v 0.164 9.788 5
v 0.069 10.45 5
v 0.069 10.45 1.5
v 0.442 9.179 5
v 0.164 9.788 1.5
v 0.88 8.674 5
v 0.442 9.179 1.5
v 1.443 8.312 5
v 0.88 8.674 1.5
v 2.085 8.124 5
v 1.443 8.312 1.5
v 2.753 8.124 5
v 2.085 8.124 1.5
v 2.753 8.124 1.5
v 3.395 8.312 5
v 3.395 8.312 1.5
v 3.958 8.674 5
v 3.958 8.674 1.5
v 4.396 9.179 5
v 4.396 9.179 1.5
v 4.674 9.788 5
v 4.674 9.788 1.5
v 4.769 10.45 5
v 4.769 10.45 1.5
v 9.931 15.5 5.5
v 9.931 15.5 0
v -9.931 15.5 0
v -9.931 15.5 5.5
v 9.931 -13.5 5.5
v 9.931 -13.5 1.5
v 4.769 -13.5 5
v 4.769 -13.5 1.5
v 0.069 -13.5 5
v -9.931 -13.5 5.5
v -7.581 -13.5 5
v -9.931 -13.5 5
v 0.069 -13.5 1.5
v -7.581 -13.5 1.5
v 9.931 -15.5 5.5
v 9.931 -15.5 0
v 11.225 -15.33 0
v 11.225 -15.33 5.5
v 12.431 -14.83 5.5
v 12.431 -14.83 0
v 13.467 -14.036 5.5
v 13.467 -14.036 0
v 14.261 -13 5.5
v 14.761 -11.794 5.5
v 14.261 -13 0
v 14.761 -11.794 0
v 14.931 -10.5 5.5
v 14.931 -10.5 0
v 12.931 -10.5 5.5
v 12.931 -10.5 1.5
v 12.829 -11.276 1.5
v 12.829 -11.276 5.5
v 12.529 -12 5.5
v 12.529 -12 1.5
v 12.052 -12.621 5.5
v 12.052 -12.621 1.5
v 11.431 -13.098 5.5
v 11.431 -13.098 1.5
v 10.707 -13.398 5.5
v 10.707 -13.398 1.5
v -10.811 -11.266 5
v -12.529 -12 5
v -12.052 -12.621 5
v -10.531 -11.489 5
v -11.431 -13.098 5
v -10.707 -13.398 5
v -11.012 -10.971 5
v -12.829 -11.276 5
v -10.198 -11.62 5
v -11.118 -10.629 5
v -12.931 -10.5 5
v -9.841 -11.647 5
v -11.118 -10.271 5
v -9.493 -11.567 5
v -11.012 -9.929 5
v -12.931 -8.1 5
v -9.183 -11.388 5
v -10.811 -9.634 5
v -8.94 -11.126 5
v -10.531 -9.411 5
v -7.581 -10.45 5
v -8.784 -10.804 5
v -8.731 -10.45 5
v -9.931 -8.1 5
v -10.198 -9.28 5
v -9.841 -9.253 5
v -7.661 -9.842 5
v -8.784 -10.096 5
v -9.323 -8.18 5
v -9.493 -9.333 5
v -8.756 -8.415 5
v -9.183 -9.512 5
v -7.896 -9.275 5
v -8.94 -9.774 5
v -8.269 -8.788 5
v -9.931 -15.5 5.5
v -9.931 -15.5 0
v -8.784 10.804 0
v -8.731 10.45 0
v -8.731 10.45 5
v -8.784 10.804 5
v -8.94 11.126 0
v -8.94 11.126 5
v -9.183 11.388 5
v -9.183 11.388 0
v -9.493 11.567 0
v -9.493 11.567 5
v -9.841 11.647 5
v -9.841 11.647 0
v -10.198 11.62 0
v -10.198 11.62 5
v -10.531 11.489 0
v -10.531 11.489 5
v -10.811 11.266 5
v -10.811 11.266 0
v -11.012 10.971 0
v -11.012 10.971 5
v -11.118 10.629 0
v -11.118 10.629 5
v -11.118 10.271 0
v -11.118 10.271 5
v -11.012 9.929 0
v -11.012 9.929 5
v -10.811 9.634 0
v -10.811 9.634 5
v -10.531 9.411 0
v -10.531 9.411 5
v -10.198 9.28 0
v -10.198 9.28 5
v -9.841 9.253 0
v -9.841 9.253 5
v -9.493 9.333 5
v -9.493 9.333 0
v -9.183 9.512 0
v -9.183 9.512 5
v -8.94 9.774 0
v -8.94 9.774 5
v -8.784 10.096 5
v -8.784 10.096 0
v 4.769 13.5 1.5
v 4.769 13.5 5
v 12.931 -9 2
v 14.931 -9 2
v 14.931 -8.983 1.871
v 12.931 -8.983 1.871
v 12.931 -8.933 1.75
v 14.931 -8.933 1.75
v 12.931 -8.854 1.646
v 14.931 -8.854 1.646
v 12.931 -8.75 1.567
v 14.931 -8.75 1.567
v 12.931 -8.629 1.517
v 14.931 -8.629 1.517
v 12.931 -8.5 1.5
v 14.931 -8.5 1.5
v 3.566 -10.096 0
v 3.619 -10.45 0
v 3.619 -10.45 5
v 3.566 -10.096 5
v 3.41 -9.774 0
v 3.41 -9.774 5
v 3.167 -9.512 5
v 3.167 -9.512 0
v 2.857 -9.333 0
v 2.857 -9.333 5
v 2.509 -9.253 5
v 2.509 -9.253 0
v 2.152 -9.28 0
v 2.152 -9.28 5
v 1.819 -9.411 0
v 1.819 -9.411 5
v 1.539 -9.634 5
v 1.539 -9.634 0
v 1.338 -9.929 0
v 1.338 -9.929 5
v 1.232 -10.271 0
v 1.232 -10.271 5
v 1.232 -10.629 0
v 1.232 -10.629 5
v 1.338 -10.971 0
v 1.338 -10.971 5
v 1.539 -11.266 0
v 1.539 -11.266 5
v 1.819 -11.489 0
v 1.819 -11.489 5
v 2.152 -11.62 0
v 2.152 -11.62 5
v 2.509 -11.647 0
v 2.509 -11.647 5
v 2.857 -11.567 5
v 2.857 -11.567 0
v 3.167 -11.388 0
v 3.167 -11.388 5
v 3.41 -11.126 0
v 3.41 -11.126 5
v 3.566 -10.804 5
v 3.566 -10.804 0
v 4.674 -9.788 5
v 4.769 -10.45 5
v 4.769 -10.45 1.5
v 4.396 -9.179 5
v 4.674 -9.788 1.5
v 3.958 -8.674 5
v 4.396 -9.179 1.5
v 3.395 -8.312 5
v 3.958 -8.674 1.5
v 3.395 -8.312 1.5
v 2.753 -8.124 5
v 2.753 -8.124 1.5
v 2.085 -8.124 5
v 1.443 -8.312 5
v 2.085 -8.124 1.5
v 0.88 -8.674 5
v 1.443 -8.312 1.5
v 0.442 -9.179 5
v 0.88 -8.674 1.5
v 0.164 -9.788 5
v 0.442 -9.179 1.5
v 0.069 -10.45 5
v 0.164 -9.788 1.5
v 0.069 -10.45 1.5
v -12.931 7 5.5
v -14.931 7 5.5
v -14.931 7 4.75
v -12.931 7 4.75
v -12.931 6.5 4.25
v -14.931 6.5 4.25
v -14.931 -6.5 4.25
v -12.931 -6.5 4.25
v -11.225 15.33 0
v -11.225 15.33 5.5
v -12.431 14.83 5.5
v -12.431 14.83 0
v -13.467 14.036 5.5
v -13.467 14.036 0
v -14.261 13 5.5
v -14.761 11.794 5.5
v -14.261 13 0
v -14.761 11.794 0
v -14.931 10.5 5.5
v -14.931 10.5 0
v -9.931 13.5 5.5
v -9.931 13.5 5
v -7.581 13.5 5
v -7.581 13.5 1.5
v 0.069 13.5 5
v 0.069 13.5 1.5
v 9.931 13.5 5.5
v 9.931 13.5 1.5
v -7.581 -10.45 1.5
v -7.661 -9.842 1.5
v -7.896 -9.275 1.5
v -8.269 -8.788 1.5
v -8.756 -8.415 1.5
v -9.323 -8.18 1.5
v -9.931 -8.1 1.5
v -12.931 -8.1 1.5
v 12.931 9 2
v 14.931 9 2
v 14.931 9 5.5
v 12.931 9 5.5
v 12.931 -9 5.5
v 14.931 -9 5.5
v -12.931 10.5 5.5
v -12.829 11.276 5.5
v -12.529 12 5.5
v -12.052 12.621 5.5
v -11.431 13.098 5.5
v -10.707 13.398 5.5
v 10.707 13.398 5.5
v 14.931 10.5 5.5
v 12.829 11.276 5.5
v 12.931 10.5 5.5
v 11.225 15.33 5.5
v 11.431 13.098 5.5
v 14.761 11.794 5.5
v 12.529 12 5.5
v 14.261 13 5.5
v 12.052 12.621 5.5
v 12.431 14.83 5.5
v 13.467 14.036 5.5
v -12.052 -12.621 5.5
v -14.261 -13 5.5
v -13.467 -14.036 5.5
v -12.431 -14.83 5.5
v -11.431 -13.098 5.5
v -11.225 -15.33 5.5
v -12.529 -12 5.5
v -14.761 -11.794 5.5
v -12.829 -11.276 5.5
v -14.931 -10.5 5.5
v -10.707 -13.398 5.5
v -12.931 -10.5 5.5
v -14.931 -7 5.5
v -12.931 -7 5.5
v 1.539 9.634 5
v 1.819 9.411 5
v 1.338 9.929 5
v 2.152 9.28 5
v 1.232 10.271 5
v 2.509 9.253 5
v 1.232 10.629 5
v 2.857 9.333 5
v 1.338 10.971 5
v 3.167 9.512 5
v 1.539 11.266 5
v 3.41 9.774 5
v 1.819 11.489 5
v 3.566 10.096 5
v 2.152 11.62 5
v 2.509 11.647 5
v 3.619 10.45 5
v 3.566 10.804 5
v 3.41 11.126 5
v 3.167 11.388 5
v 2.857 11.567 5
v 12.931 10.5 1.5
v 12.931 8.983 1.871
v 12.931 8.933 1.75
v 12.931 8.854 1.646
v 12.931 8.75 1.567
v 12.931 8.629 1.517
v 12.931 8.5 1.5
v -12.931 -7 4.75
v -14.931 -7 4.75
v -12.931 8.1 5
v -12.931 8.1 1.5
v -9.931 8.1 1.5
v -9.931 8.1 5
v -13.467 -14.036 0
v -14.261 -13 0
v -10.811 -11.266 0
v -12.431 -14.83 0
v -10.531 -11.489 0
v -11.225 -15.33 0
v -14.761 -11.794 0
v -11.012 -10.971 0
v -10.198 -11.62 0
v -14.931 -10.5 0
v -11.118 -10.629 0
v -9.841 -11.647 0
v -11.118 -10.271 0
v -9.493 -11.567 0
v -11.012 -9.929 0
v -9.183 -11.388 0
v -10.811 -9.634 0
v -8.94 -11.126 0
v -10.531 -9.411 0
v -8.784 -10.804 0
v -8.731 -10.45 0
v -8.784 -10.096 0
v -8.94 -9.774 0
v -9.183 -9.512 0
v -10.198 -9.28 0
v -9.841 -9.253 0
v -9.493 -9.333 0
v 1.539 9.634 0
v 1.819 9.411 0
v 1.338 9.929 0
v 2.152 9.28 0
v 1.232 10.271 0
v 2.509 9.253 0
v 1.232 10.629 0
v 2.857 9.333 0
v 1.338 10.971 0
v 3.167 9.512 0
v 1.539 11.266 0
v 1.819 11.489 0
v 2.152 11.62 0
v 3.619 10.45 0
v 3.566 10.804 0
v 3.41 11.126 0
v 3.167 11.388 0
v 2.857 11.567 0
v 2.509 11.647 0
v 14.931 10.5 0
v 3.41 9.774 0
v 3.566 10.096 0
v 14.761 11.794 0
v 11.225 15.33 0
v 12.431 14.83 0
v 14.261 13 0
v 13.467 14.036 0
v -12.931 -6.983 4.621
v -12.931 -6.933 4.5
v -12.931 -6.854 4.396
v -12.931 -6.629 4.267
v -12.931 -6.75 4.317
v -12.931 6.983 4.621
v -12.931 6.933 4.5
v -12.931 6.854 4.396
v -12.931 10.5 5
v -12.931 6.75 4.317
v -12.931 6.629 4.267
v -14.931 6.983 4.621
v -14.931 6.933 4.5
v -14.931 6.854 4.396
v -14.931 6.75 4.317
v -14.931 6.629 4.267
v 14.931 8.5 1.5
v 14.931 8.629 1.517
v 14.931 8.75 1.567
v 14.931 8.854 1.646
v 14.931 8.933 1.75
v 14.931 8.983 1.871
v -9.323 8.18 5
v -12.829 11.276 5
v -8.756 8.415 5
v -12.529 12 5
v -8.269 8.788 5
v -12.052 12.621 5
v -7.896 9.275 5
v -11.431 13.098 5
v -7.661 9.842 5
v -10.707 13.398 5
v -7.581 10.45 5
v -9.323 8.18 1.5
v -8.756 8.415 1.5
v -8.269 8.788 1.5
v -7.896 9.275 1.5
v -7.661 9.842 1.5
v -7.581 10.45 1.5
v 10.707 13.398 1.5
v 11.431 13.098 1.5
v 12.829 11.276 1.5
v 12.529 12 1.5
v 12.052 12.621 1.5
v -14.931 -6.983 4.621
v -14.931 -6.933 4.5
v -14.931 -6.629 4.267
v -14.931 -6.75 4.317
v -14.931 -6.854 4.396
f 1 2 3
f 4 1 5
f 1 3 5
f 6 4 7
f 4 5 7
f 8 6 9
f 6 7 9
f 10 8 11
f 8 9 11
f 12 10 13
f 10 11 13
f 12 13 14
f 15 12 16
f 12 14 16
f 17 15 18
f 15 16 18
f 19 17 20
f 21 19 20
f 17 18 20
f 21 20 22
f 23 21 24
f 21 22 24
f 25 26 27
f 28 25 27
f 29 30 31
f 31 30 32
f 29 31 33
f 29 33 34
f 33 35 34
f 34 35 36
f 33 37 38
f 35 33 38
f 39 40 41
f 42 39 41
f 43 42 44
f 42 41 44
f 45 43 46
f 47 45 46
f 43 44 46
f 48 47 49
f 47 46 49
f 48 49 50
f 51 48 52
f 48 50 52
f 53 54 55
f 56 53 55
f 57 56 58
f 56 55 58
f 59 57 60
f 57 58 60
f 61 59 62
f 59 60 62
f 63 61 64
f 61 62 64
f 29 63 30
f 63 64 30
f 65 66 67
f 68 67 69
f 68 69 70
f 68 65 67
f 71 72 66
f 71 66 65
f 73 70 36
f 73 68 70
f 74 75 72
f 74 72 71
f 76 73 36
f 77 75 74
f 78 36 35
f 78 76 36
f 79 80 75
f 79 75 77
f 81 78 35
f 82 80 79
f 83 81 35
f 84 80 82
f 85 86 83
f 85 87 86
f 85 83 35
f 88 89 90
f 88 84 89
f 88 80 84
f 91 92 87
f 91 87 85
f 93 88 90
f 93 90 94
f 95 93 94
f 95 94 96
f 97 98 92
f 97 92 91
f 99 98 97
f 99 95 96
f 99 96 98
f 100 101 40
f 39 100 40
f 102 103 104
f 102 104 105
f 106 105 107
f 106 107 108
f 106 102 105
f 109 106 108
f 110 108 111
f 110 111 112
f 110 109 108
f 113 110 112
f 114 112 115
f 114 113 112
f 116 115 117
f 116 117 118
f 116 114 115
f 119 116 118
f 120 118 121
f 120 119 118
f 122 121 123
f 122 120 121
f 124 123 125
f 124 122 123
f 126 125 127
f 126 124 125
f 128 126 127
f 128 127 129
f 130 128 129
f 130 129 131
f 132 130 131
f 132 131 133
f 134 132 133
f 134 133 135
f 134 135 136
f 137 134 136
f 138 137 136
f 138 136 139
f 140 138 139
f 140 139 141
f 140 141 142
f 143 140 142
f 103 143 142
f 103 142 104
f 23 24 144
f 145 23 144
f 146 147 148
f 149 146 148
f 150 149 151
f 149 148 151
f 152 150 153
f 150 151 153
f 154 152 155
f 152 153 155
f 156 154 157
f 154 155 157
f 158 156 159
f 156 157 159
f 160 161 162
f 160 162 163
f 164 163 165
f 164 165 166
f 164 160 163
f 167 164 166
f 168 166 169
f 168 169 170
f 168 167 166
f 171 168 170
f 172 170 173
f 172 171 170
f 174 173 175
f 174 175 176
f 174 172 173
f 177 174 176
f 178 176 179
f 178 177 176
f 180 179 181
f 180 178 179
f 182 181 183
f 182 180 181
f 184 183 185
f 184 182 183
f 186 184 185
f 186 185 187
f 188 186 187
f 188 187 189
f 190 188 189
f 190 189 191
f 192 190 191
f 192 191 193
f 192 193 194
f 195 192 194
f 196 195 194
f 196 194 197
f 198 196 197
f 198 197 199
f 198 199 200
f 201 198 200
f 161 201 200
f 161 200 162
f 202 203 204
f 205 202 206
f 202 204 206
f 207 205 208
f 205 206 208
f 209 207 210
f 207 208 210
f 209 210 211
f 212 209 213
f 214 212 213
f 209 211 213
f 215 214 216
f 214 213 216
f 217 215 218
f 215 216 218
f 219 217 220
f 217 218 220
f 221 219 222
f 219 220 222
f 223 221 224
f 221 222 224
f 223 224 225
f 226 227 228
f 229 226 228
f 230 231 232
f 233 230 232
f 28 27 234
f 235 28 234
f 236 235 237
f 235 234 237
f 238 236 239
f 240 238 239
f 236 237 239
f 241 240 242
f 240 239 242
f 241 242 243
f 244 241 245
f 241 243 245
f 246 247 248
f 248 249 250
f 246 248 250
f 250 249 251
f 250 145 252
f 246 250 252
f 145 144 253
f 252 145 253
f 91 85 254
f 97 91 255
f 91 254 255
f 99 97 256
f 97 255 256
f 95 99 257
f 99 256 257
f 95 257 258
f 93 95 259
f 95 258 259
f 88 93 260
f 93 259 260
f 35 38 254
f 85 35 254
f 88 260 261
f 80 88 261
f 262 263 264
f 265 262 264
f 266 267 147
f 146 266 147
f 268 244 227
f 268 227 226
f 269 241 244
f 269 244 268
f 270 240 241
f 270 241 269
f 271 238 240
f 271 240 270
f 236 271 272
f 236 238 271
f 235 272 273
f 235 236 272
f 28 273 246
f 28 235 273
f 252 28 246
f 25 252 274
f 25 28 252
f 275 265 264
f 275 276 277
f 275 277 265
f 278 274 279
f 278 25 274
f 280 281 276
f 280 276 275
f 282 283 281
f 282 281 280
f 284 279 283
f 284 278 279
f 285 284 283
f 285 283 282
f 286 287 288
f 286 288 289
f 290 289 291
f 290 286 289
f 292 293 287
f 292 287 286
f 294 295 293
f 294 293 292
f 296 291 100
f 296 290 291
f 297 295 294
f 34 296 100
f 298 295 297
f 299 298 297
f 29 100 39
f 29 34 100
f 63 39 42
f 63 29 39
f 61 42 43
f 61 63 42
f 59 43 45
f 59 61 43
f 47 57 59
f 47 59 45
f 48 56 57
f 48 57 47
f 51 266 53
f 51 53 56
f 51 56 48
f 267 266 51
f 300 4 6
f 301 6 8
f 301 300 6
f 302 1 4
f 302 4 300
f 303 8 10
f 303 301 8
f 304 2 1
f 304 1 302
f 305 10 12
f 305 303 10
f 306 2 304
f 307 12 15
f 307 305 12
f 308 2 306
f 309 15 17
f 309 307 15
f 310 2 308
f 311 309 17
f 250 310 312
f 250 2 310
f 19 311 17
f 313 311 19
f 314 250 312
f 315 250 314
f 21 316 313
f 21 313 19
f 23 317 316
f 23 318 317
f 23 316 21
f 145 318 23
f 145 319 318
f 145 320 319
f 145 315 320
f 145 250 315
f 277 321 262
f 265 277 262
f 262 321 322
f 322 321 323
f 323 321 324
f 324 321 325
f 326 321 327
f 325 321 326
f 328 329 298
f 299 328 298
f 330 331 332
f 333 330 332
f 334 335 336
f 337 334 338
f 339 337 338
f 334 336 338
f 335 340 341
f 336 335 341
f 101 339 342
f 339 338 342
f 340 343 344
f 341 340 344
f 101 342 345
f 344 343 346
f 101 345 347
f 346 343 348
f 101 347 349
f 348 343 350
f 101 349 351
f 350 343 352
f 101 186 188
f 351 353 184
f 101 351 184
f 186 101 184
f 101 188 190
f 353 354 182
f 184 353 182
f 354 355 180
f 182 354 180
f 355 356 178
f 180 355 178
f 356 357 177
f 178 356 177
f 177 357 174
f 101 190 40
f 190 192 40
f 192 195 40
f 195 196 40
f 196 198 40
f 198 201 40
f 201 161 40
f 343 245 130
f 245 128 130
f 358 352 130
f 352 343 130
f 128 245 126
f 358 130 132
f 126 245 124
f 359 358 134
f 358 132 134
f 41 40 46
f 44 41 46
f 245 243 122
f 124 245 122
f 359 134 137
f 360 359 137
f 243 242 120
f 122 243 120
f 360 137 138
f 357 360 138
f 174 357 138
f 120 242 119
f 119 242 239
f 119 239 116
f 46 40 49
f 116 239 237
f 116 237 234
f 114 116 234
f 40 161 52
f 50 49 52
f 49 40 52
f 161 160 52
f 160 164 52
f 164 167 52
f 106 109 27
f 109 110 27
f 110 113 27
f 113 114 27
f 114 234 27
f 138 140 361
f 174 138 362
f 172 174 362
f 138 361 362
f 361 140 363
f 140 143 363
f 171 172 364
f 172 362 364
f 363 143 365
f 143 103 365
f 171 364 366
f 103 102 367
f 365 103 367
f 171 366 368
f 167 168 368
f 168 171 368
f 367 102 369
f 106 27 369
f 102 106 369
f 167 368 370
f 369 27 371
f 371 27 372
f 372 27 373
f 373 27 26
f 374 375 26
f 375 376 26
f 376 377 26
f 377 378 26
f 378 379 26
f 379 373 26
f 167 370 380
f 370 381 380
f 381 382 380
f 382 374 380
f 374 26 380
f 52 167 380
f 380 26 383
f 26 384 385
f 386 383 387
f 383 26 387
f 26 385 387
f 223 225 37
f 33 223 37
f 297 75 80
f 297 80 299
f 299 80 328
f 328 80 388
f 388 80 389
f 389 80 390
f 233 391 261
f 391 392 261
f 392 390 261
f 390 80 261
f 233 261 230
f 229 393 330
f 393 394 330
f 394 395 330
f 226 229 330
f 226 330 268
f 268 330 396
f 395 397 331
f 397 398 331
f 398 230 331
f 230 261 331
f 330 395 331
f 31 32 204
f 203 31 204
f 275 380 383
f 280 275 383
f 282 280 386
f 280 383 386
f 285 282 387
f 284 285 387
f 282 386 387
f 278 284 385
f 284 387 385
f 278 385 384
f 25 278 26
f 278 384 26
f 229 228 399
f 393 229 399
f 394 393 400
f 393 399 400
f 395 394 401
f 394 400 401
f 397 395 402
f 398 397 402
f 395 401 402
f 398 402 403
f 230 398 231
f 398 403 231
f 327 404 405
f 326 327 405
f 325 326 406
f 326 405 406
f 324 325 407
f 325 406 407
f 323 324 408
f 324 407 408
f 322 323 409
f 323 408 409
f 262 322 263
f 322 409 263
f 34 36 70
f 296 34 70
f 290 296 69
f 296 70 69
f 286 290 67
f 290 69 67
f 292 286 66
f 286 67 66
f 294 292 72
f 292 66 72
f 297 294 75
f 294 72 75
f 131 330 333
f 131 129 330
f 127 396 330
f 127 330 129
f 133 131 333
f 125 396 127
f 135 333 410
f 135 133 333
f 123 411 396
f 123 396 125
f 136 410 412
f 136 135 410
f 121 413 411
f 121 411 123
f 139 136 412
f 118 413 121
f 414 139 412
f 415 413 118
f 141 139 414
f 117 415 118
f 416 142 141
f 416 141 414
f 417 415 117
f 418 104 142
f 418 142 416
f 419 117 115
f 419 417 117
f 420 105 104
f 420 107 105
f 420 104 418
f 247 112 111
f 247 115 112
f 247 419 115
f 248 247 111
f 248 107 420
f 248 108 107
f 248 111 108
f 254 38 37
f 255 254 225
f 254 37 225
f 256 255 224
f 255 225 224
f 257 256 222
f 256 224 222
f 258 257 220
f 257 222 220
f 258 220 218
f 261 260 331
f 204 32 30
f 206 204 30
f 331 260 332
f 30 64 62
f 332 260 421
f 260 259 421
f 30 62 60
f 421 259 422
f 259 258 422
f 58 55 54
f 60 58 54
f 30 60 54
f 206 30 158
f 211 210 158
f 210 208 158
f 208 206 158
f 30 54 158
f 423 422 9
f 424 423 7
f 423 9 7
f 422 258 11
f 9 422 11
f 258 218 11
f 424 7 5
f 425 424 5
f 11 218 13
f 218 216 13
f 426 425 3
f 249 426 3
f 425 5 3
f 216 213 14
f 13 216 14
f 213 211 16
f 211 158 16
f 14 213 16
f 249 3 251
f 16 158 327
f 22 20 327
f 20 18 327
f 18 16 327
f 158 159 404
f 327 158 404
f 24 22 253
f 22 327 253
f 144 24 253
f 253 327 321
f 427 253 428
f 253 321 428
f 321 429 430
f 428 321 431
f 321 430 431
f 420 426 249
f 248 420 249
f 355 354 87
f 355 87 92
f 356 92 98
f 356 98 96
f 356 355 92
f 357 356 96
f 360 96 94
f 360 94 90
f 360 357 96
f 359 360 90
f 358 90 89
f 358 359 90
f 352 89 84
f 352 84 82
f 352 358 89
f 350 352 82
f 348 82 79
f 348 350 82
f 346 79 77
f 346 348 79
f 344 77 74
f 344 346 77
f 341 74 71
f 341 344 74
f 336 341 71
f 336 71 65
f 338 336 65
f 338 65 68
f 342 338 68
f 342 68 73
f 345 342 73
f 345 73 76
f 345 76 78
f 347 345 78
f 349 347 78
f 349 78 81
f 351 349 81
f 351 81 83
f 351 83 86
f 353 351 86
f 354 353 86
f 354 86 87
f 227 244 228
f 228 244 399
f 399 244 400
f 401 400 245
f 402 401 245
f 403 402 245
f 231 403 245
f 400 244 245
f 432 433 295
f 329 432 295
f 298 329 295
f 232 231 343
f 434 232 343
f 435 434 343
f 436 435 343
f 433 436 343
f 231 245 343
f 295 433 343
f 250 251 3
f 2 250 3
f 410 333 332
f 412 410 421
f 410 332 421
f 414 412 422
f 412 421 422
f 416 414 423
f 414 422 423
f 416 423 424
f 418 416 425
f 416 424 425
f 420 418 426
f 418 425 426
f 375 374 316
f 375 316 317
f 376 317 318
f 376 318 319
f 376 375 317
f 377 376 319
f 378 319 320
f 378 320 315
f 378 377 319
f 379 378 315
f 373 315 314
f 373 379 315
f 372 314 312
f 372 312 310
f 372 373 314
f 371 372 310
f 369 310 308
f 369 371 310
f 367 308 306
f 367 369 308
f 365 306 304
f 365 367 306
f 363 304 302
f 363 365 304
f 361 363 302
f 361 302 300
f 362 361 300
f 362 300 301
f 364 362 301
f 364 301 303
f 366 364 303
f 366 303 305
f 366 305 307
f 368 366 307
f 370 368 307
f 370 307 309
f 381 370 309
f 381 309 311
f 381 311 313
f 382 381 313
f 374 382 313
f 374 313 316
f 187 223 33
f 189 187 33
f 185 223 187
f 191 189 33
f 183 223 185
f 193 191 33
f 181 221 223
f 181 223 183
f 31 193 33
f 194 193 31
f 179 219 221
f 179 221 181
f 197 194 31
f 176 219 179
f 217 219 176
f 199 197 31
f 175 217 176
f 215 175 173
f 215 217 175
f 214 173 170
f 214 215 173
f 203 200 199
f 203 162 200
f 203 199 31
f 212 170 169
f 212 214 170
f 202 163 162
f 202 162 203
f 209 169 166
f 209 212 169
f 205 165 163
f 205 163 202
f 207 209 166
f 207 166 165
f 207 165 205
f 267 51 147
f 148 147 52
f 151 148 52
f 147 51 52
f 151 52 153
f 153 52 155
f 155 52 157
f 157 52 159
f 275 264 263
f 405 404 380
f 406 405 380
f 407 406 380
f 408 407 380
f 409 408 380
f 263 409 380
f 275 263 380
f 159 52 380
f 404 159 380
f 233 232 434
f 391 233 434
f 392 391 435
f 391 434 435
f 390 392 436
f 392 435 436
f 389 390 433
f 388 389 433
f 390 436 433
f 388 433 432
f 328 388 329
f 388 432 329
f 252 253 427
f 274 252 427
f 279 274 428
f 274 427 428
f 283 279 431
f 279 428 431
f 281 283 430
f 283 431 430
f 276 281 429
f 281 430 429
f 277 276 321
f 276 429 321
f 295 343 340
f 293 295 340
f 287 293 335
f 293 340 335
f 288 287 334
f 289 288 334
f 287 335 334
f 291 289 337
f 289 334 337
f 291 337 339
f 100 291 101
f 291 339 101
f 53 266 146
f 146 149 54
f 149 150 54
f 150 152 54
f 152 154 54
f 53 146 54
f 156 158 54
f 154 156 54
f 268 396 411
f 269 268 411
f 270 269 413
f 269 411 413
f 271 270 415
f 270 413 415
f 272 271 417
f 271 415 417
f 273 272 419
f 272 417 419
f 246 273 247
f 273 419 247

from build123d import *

# Parameters (mm, degrees)
F0_R     = 1.2
F1_DEPTH = 1.5
F2_DEPTH = 5
F3_DEPTH = 5.5
F5_DEPTH = 2
F7_DEPTH = 2


# Not quite as in the source:
# - a feature names something its author has since deleted; it is built from what else it names


with BuildPart() as f1:
    # F0 (on Top) → F1 (new body)
    with BuildSketch(Plane.XY):
        with BuildLine():
            Line((14.9310000289, -10.5), (14.9310000289, 10.5))
            ThreePointArc((14.9310000289, 10.5), (13.4665339264, 14.0355339264), (9.931, 15.5000000289))
            Line((9.931, 15.5000000289), (-9.931, 15.5000000289))
            ThreePointArc((-9.931, 15.5000000289), (-13.4665339264, 14.0355339264), (-14.9310000289, 10.5))
            Line((-14.9310000289, 10.5), (-14.9310000289, -10.5))
            ThreePointArc((-14.9310000289, -10.5), (-13.4665339264, -14.0355339264), (-9.931, -15.5000000289))
            Line((-9.931, -15.5000000289), (9.931, -15.5000000289))
            ThreePointArc((9.931, -15.5000000289), (13.4665339264, -14.0355339264), (14.9310000289, -10.5))
        make_face()
        with BuildLine():
            Line((-9.931, 13.5000000289), (-7.581, 13.5000000289))
            Line((-7.581, 13.5000000289), (0.069, 13.5000000289))
            Line((0.069, 13.5000000289), (4.769, 13.5000000289))
            Line((4.769, 13.5000000289), (9.931, 13.5000000289))
            ThreePointArc((9.931, 13.5000000289), (12.052320364, 12.621320364), (12.9310000289, 10.5))
            Line((12.9310000289, 10.5), (12.9310000289, -10.5))
            ThreePointArc((12.9310000289, -10.5), (12.052320364, -12.621320364), (9.931, -13.5000000289))
            Line((9.931, -13.5000000289), (4.769, -13.5000000289))
            Line((4.769, -13.5000000289), (0.069, -13.5000000289))
            Line((0.069, -13.5000000289), (-7.581, -13.5000000289))
            Line((-7.581, -13.5000000289), (-9.931, -13.5000000289))
            ThreePointArc((-9.931, -13.5000000289), (-12.052320364, -12.621320364), (-12.9310000289, -10.5))
            Line((-12.9310000289, -10.5), (-12.9310000289, -8.1))
            Line((-12.9310000289, -8.1), (-12.9310000289, 8.1))
            Line((-12.9310000289, 8.1), (-12.9310000289, 10.5))
            ThreePointArc((-12.9310000289, 10.5), (-12.052320364, 12.621320364), (-9.931, 13.5000000289))
        make_face(mode=Mode.SUBTRACT)
        with BuildLine():
            ThreePointArc((4.769, -10.45), (2.419, -8.1), (0.069, -10.45))
            ThreePointArc((0.069, -10.45), (2.419, -12.8), (4.769, -10.45))
        make_face()
        with Locations((2.419, -10.45)):
            Circle(F0_R, mode=Mode.SUBTRACT)
        with BuildLine():
            ThreePointArc((4.769, 10.45), (2.419, 12.8), (0.069, 10.45))
            ThreePointArc((0.069, 10.45), (2.419, 8.1), (4.769, 10.45))
        make_face()
        with Locations((2.419, 10.45)):
            Circle(F0_R, mode=Mode.SUBTRACT)
        with BuildLine():
            ThreePointArc((-9.931, 8.1), (-11.5927009358, 12.1117009358), (-7.581, 10.45))
            Line((-7.581, 10.45), (-7.581, 13.5000000289))
            Line((-7.581, 13.5000000289), (-9.931, 13.5000000289))
            ThreePointArc((-9.931, 13.5000000289), (-12.052320364, 12.621320364), (-12.9310000289, 10.5))
            Line((-12.9310000289, 10.5), (-12.9310000289, 8.1))
            Line((-12.9310000289, 8.1), (-9.931, 8.1))
        make_face()
        with BuildLine():
            Line((-9.931, -8.1), (-12.9310000289, -8.1))
            Line((-12.9310000289, -8.1), (-12.9310000289, -10.5))
            ThreePointArc((-12.9310000289, -10.5), (-12.052320364, -12.621320364), (-9.931, -13.5000000289))
            Line((-9.931, -13.5000000289), (-7.581, -13.5000000289))
            Line((-7.581, -13.5000000289), (-7.581, -10.45))
            ThreePointArc((-7.581, -10.45), (-11.5927009358, -12.1117009358), (-9.931, -8.1))
        make_face()
        with BuildLine():
            ThreePointArc((-7.581, -10.45), (-8.2692990642, -8.7882990642), (-9.931, -8.1))
            ThreePointArc((-9.931, -8.1), (-11.5927009358, -12.1117009358), (-7.581, -10.45))
        make_face()
        with Locations((-9.931, -10.45)):
            Circle(F0_R, mode=Mode.SUBTRACT)
        with BuildLine():
            Line((0.069, -10.45), (0.069, -13.5000000289))
            Line((0.069, -13.5000000289), (4.769, -13.5000000289))
            Line((4.769, -13.5000000289), (4.769, -10.45))
            ThreePointArc((4.769, -10.45), (2.419, -12.8), (0.069, -10.45))
        make_face()
        with BuildLine():
            ThreePointArc((-9.931, 8.1), (-8.2692990642, 8.7882990642), (-7.581, 10.45))
            ThreePointArc((-7.581, 10.45), (-11.5927009358, 12.1117009358), (-9.931, 8.1))
        make_face()
        with Locations((-9.931, 10.45)):
            Circle(F0_R, mode=Mode.SUBTRACT)
        with BuildLine():
            Line((4.769, 13.5000000289), (0.069, 13.5000000289))
            Line((0.069, 13.5000000289), (0.069, 10.45))
            ThreePointArc((0.069, 10.45), (2.419, 12.8), (4.769, 10.45))
            Line((4.769, 10.45), (4.769, 13.5000000289))
        make_face()
        with BuildLine():
            Line((-7.581, 13.5000000289), (-7.581, 10.45))
            ThreePointArc((-7.581, 10.45), (-8.2692990642, 8.7882990642), (-9.931, 8.1))
            Line((-9.931, 8.1), (-12.9310000289, 8.1))
            Line((-12.9310000289, 8.1), (-12.9310000289, -8.1))
            Line((-12.9310000289, -8.1), (-9.931, -8.1))
            ThreePointArc((-9.931, -8.1), (-8.2692990642, -8.7882990642), (-7.581, -10.45))
            Line((-7.581, -10.45), (-7.581, -13.5000000289))
            Line((-7.581, -13.5000000289), (0.069, -13.5000000289))
            Line((0.069, -13.5000000289), (0.069, -10.45))
            ThreePointArc((0.069, -10.45), (2.419, -8.1), (4.769, -10.45))
            Line((4.769, -10.45), (4.769, -13.5000000289))
            Line((4.769, -13.5000000289), (9.931, -13.5000000289))
            ThreePointArc((9.931, -13.5000000289), (12.052320364, -12.621320364), (12.9310000289, -10.5))
            Line((12.9310000289, -10.5), (12.9310000289, 10.5))
            ThreePointArc((12.9310000289, 10.5), (12.052320364, 12.621320364), (9.931, 13.5000000289))
            Line((9.931, 13.5000000289), (4.769, 13.5000000289))
            Line((4.769, 13.5000000289), (4.769, 10.45))
            ThreePointArc((4.769, 10.45), (2.419, 8.1), (0.069, 10.45))
            Line((0.069, 10.45), (0.069, 13.5000000289))
            Line((0.069, 13.5000000289), (-7.581, 13.5000000289))
        make_face()
    extrude(amount=F1_DEPTH)

    # F0 (on Top) → F2 (join)
    with BuildSketch(Plane.XY):
        with BuildLine():
            ThreePointArc((-9.931, 8.1), (-11.5927009358, 12.1117009358), (-7.581, 10.45))
            Line((-7.581, 10.45), (-7.581, 13.5000000289))
            Line((-7.581, 13.5000000289), (-9.931, 13.5000000289))
            ThreePointArc((-9.931, 13.5000000289), (-12.052320364, 12.621320364), (-12.9310000289, 10.5))
            Line((-12.9310000289, 10.5), (-12.9310000289, 8.1))
            Line((-12.9310000289, 8.1), (-9.931, 8.1))
        make_face()
        with BuildLine():
            ThreePointArc((-9.931, 8.1), (-8.2692990642, 8.7882990642), (-7.581, 10.45))
            ThreePointArc((-7.581, 10.45), (-11.5927009358, 12.1117009358), (-9.931, 8.1))
        make_face()
        with Locations((-9.931, 10.45)):
            Circle(F0_R, mode=Mode.SUBTRACT)
        with BuildLine():
            ThreePointArc((4.769, 10.45), (2.419, 12.8), (0.069, 10.45))
            ThreePointArc((0.069, 10.45), (2.419, 8.1), (4.769, 10.45))
        make_face()
        with Locations((2.419, 10.45)):
            Circle(F0_R, mode=Mode.SUBTRACT)
        with BuildLine():
            Line((4.769, 13.5000000289), (0.069, 13.5000000289))
            Line((0.069, 13.5000000289), (0.069, 10.45))
            ThreePointArc((0.069, 10.45), (2.419, 12.8), (4.769, 10.45))
            Line((4.769, 10.45), (4.769, 13.5000000289))
        make_face()
        with BuildLine():
            ThreePointArc((4.769, -10.45), (2.419, -8.1), (0.069, -10.45))
            ThreePointArc((0.069, -10.45), (2.419, -12.8), (4.769, -10.45))
        make_face()
        with Locations((2.419, -10.45)):
            Circle(F0_R, mode=Mode.SUBTRACT)
        with BuildLine():
            Line((0.069, -10.45), (0.069, -13.5000000289))
            Line((0.069, -13.5000000289), (4.769, -13.5000000289))
            Line((4.769, -13.5000000289), (4.769, -10.45))
            ThreePointArc((4.769, -10.45), (2.419, -12.8), (0.069, -10.45))
        make_face()
        with BuildLine():
            ThreePointArc((-7.581, -10.45), (-8.2692990642, -8.7882990642), (-9.931, -8.1))
            ThreePointArc((-9.931, -8.1), (-11.5927009358, -12.1117009358), (-7.581, -10.45))
        make_face()
        with Locations((-9.931, -10.45)):
            Circle(F0_R, mode=Mode.SUBTRACT)
        with BuildLine():
            Line((-9.931, -8.1), (-12.9310000289, -8.1))
            Line((-12.9310000289, -8.1), (-12.9310000289, -10.5))
            ThreePointArc((-12.9310000289, -10.5), (-12.052320364, -12.621320364), (-9.931, -13.5000000289))
            Line((-9.931, -13.5000000289), (-7.581, -13.5000000289))
            Line((-7.581, -13.5000000289), (-7.581, -10.45))
            ThreePointArc((-7.581, -10.45), (-11.5927009358, -12.1117009358), (-9.931, -8.1))
        make_face()
    extrude(amount=F2_DEPTH)

    # F0 (on Top) → F3 (join)
    with BuildSketch(Plane.XY):
        with BuildLine():
            Line((14.9310000289, -10.5), (14.9310000289, 10.5))
            ThreePointArc((14.9310000289, 10.5), (13.4665339264, 14.0355339264), (9.931, 15.5000000289))
            Line((9.931, 15.5000000289), (-9.931, 15.5000000289))
            ThreePointArc((-9.931, 15.5000000289), (-13.4665339264, 14.0355339264), (-14.9310000289, 10.5))
            Line((-14.9310000289, 10.5), (-14.9310000289, -10.5))
            ThreePointArc((-14.9310000289, -10.5), (-13.4665339264, -14.0355339264), (-9.931, -15.5000000289))
            Line((-9.931, -15.5000000289), (9.931, -15.5000000289))
            ThreePointArc((9.931, -15.5000000289), (13.4665339264, -14.0355339264), (14.9310000289, -10.5))
        make_face()
        with BuildLine():
            Line((-9.931, 13.5000000289), (-7.581, 13.5000000289))
            Line((-7.581, 13.5000000289), (0.069, 13.5000000289))
            Line((0.069, 13.5000000289), (4.769, 13.5000000289))
            Line((4.769, 13.5000000289), (9.931, 13.5000000289))
            ThreePointArc((9.931, 13.5000000289), (12.052320364, 12.621320364), (12.9310000289, 10.5))
            Line((12.9310000289, 10.5), (12.9310000289, -10.5))
            ThreePointArc((12.9310000289, -10.5), (12.052320364, -12.621320364), (9.931, -13.5000000289))
            Line((9.931, -13.5000000289), (4.769, -13.5000000289))
            Line((4.769, -13.5000000289), (0.069, -13.5000000289))
            Line((0.069, -13.5000000289), (-7.581, -13.5000000289))
            Line((-7.581, -13.5000000289), (-9.931, -13.5000000289))
            ThreePointArc((-9.931, -13.5000000289), (-12.052320364, -12.621320364), (-12.9310000289, -10.5))
            Line((-12.9310000289, -10.5), (-12.9310000289, -8.1))
            Line((-12.9310000289, -8.1), (-12.9310000289, 8.1))
            Line((-12.9310000289, 8.1), (-12.9310000289, 10.5))
            ThreePointArc((-12.9310000289, 10.5), (-12.052320364, 12.621320364), (-9.931, 13.5000000289))
        make_face(mode=Mode.SUBTRACT)
    extrude(amount=F3_DEPTH)

    # F4 (on face) → F5 (cut)
    with BuildSketch(Plane(origin=(-14.9310000289, 0, 0), x_dir=(0, -1, 0), z_dir=(-1, 0, 0))):
        with BuildLine():
            Line((7, 5.5), (-7, 5.5))
            Line((-7, 5.5), (-7, 4.75))
            ThreePointArc((-7, 4.75), (-6.8535533906, 4.3964466094), (-6.5, 4.25))
            Line((-6.5, 4.25), (6.5, 4.25))
            ThreePointArc((6.5, 4.25), (6.8535533906, 4.3964466094), (7, 4.75))
            Line((7, 4.75), (7, 5.5))
        make_face()
    extrude(amount=-F5_DEPTH, mode=Mode.SUBTRACT)

    # F6 (on face) → F7 (cut)
    with BuildSketch(Plane.YZ.offset(14.9310000289)):
        with BuildLine():
            Line((9, 2), (9, 5.5))
            Line((9, 5.5), (-9, 5.5))
            Line((-9, 5.5), (-9, 2))
            ThreePointArc((-9, 2), (-8.8535533906, 1.6464466094), (-8.5, 1.5))
            Line((-8.5, 1.5), (8.5, 1.5))
            ThreePointArc((8.5, 1.5), (8.8535533906, 1.6464466094), (9, 2))
        make_face()
    extrude(amount=-F7_DEPTH, mode=Mode.SUBTRACT)


solid = f1.part
